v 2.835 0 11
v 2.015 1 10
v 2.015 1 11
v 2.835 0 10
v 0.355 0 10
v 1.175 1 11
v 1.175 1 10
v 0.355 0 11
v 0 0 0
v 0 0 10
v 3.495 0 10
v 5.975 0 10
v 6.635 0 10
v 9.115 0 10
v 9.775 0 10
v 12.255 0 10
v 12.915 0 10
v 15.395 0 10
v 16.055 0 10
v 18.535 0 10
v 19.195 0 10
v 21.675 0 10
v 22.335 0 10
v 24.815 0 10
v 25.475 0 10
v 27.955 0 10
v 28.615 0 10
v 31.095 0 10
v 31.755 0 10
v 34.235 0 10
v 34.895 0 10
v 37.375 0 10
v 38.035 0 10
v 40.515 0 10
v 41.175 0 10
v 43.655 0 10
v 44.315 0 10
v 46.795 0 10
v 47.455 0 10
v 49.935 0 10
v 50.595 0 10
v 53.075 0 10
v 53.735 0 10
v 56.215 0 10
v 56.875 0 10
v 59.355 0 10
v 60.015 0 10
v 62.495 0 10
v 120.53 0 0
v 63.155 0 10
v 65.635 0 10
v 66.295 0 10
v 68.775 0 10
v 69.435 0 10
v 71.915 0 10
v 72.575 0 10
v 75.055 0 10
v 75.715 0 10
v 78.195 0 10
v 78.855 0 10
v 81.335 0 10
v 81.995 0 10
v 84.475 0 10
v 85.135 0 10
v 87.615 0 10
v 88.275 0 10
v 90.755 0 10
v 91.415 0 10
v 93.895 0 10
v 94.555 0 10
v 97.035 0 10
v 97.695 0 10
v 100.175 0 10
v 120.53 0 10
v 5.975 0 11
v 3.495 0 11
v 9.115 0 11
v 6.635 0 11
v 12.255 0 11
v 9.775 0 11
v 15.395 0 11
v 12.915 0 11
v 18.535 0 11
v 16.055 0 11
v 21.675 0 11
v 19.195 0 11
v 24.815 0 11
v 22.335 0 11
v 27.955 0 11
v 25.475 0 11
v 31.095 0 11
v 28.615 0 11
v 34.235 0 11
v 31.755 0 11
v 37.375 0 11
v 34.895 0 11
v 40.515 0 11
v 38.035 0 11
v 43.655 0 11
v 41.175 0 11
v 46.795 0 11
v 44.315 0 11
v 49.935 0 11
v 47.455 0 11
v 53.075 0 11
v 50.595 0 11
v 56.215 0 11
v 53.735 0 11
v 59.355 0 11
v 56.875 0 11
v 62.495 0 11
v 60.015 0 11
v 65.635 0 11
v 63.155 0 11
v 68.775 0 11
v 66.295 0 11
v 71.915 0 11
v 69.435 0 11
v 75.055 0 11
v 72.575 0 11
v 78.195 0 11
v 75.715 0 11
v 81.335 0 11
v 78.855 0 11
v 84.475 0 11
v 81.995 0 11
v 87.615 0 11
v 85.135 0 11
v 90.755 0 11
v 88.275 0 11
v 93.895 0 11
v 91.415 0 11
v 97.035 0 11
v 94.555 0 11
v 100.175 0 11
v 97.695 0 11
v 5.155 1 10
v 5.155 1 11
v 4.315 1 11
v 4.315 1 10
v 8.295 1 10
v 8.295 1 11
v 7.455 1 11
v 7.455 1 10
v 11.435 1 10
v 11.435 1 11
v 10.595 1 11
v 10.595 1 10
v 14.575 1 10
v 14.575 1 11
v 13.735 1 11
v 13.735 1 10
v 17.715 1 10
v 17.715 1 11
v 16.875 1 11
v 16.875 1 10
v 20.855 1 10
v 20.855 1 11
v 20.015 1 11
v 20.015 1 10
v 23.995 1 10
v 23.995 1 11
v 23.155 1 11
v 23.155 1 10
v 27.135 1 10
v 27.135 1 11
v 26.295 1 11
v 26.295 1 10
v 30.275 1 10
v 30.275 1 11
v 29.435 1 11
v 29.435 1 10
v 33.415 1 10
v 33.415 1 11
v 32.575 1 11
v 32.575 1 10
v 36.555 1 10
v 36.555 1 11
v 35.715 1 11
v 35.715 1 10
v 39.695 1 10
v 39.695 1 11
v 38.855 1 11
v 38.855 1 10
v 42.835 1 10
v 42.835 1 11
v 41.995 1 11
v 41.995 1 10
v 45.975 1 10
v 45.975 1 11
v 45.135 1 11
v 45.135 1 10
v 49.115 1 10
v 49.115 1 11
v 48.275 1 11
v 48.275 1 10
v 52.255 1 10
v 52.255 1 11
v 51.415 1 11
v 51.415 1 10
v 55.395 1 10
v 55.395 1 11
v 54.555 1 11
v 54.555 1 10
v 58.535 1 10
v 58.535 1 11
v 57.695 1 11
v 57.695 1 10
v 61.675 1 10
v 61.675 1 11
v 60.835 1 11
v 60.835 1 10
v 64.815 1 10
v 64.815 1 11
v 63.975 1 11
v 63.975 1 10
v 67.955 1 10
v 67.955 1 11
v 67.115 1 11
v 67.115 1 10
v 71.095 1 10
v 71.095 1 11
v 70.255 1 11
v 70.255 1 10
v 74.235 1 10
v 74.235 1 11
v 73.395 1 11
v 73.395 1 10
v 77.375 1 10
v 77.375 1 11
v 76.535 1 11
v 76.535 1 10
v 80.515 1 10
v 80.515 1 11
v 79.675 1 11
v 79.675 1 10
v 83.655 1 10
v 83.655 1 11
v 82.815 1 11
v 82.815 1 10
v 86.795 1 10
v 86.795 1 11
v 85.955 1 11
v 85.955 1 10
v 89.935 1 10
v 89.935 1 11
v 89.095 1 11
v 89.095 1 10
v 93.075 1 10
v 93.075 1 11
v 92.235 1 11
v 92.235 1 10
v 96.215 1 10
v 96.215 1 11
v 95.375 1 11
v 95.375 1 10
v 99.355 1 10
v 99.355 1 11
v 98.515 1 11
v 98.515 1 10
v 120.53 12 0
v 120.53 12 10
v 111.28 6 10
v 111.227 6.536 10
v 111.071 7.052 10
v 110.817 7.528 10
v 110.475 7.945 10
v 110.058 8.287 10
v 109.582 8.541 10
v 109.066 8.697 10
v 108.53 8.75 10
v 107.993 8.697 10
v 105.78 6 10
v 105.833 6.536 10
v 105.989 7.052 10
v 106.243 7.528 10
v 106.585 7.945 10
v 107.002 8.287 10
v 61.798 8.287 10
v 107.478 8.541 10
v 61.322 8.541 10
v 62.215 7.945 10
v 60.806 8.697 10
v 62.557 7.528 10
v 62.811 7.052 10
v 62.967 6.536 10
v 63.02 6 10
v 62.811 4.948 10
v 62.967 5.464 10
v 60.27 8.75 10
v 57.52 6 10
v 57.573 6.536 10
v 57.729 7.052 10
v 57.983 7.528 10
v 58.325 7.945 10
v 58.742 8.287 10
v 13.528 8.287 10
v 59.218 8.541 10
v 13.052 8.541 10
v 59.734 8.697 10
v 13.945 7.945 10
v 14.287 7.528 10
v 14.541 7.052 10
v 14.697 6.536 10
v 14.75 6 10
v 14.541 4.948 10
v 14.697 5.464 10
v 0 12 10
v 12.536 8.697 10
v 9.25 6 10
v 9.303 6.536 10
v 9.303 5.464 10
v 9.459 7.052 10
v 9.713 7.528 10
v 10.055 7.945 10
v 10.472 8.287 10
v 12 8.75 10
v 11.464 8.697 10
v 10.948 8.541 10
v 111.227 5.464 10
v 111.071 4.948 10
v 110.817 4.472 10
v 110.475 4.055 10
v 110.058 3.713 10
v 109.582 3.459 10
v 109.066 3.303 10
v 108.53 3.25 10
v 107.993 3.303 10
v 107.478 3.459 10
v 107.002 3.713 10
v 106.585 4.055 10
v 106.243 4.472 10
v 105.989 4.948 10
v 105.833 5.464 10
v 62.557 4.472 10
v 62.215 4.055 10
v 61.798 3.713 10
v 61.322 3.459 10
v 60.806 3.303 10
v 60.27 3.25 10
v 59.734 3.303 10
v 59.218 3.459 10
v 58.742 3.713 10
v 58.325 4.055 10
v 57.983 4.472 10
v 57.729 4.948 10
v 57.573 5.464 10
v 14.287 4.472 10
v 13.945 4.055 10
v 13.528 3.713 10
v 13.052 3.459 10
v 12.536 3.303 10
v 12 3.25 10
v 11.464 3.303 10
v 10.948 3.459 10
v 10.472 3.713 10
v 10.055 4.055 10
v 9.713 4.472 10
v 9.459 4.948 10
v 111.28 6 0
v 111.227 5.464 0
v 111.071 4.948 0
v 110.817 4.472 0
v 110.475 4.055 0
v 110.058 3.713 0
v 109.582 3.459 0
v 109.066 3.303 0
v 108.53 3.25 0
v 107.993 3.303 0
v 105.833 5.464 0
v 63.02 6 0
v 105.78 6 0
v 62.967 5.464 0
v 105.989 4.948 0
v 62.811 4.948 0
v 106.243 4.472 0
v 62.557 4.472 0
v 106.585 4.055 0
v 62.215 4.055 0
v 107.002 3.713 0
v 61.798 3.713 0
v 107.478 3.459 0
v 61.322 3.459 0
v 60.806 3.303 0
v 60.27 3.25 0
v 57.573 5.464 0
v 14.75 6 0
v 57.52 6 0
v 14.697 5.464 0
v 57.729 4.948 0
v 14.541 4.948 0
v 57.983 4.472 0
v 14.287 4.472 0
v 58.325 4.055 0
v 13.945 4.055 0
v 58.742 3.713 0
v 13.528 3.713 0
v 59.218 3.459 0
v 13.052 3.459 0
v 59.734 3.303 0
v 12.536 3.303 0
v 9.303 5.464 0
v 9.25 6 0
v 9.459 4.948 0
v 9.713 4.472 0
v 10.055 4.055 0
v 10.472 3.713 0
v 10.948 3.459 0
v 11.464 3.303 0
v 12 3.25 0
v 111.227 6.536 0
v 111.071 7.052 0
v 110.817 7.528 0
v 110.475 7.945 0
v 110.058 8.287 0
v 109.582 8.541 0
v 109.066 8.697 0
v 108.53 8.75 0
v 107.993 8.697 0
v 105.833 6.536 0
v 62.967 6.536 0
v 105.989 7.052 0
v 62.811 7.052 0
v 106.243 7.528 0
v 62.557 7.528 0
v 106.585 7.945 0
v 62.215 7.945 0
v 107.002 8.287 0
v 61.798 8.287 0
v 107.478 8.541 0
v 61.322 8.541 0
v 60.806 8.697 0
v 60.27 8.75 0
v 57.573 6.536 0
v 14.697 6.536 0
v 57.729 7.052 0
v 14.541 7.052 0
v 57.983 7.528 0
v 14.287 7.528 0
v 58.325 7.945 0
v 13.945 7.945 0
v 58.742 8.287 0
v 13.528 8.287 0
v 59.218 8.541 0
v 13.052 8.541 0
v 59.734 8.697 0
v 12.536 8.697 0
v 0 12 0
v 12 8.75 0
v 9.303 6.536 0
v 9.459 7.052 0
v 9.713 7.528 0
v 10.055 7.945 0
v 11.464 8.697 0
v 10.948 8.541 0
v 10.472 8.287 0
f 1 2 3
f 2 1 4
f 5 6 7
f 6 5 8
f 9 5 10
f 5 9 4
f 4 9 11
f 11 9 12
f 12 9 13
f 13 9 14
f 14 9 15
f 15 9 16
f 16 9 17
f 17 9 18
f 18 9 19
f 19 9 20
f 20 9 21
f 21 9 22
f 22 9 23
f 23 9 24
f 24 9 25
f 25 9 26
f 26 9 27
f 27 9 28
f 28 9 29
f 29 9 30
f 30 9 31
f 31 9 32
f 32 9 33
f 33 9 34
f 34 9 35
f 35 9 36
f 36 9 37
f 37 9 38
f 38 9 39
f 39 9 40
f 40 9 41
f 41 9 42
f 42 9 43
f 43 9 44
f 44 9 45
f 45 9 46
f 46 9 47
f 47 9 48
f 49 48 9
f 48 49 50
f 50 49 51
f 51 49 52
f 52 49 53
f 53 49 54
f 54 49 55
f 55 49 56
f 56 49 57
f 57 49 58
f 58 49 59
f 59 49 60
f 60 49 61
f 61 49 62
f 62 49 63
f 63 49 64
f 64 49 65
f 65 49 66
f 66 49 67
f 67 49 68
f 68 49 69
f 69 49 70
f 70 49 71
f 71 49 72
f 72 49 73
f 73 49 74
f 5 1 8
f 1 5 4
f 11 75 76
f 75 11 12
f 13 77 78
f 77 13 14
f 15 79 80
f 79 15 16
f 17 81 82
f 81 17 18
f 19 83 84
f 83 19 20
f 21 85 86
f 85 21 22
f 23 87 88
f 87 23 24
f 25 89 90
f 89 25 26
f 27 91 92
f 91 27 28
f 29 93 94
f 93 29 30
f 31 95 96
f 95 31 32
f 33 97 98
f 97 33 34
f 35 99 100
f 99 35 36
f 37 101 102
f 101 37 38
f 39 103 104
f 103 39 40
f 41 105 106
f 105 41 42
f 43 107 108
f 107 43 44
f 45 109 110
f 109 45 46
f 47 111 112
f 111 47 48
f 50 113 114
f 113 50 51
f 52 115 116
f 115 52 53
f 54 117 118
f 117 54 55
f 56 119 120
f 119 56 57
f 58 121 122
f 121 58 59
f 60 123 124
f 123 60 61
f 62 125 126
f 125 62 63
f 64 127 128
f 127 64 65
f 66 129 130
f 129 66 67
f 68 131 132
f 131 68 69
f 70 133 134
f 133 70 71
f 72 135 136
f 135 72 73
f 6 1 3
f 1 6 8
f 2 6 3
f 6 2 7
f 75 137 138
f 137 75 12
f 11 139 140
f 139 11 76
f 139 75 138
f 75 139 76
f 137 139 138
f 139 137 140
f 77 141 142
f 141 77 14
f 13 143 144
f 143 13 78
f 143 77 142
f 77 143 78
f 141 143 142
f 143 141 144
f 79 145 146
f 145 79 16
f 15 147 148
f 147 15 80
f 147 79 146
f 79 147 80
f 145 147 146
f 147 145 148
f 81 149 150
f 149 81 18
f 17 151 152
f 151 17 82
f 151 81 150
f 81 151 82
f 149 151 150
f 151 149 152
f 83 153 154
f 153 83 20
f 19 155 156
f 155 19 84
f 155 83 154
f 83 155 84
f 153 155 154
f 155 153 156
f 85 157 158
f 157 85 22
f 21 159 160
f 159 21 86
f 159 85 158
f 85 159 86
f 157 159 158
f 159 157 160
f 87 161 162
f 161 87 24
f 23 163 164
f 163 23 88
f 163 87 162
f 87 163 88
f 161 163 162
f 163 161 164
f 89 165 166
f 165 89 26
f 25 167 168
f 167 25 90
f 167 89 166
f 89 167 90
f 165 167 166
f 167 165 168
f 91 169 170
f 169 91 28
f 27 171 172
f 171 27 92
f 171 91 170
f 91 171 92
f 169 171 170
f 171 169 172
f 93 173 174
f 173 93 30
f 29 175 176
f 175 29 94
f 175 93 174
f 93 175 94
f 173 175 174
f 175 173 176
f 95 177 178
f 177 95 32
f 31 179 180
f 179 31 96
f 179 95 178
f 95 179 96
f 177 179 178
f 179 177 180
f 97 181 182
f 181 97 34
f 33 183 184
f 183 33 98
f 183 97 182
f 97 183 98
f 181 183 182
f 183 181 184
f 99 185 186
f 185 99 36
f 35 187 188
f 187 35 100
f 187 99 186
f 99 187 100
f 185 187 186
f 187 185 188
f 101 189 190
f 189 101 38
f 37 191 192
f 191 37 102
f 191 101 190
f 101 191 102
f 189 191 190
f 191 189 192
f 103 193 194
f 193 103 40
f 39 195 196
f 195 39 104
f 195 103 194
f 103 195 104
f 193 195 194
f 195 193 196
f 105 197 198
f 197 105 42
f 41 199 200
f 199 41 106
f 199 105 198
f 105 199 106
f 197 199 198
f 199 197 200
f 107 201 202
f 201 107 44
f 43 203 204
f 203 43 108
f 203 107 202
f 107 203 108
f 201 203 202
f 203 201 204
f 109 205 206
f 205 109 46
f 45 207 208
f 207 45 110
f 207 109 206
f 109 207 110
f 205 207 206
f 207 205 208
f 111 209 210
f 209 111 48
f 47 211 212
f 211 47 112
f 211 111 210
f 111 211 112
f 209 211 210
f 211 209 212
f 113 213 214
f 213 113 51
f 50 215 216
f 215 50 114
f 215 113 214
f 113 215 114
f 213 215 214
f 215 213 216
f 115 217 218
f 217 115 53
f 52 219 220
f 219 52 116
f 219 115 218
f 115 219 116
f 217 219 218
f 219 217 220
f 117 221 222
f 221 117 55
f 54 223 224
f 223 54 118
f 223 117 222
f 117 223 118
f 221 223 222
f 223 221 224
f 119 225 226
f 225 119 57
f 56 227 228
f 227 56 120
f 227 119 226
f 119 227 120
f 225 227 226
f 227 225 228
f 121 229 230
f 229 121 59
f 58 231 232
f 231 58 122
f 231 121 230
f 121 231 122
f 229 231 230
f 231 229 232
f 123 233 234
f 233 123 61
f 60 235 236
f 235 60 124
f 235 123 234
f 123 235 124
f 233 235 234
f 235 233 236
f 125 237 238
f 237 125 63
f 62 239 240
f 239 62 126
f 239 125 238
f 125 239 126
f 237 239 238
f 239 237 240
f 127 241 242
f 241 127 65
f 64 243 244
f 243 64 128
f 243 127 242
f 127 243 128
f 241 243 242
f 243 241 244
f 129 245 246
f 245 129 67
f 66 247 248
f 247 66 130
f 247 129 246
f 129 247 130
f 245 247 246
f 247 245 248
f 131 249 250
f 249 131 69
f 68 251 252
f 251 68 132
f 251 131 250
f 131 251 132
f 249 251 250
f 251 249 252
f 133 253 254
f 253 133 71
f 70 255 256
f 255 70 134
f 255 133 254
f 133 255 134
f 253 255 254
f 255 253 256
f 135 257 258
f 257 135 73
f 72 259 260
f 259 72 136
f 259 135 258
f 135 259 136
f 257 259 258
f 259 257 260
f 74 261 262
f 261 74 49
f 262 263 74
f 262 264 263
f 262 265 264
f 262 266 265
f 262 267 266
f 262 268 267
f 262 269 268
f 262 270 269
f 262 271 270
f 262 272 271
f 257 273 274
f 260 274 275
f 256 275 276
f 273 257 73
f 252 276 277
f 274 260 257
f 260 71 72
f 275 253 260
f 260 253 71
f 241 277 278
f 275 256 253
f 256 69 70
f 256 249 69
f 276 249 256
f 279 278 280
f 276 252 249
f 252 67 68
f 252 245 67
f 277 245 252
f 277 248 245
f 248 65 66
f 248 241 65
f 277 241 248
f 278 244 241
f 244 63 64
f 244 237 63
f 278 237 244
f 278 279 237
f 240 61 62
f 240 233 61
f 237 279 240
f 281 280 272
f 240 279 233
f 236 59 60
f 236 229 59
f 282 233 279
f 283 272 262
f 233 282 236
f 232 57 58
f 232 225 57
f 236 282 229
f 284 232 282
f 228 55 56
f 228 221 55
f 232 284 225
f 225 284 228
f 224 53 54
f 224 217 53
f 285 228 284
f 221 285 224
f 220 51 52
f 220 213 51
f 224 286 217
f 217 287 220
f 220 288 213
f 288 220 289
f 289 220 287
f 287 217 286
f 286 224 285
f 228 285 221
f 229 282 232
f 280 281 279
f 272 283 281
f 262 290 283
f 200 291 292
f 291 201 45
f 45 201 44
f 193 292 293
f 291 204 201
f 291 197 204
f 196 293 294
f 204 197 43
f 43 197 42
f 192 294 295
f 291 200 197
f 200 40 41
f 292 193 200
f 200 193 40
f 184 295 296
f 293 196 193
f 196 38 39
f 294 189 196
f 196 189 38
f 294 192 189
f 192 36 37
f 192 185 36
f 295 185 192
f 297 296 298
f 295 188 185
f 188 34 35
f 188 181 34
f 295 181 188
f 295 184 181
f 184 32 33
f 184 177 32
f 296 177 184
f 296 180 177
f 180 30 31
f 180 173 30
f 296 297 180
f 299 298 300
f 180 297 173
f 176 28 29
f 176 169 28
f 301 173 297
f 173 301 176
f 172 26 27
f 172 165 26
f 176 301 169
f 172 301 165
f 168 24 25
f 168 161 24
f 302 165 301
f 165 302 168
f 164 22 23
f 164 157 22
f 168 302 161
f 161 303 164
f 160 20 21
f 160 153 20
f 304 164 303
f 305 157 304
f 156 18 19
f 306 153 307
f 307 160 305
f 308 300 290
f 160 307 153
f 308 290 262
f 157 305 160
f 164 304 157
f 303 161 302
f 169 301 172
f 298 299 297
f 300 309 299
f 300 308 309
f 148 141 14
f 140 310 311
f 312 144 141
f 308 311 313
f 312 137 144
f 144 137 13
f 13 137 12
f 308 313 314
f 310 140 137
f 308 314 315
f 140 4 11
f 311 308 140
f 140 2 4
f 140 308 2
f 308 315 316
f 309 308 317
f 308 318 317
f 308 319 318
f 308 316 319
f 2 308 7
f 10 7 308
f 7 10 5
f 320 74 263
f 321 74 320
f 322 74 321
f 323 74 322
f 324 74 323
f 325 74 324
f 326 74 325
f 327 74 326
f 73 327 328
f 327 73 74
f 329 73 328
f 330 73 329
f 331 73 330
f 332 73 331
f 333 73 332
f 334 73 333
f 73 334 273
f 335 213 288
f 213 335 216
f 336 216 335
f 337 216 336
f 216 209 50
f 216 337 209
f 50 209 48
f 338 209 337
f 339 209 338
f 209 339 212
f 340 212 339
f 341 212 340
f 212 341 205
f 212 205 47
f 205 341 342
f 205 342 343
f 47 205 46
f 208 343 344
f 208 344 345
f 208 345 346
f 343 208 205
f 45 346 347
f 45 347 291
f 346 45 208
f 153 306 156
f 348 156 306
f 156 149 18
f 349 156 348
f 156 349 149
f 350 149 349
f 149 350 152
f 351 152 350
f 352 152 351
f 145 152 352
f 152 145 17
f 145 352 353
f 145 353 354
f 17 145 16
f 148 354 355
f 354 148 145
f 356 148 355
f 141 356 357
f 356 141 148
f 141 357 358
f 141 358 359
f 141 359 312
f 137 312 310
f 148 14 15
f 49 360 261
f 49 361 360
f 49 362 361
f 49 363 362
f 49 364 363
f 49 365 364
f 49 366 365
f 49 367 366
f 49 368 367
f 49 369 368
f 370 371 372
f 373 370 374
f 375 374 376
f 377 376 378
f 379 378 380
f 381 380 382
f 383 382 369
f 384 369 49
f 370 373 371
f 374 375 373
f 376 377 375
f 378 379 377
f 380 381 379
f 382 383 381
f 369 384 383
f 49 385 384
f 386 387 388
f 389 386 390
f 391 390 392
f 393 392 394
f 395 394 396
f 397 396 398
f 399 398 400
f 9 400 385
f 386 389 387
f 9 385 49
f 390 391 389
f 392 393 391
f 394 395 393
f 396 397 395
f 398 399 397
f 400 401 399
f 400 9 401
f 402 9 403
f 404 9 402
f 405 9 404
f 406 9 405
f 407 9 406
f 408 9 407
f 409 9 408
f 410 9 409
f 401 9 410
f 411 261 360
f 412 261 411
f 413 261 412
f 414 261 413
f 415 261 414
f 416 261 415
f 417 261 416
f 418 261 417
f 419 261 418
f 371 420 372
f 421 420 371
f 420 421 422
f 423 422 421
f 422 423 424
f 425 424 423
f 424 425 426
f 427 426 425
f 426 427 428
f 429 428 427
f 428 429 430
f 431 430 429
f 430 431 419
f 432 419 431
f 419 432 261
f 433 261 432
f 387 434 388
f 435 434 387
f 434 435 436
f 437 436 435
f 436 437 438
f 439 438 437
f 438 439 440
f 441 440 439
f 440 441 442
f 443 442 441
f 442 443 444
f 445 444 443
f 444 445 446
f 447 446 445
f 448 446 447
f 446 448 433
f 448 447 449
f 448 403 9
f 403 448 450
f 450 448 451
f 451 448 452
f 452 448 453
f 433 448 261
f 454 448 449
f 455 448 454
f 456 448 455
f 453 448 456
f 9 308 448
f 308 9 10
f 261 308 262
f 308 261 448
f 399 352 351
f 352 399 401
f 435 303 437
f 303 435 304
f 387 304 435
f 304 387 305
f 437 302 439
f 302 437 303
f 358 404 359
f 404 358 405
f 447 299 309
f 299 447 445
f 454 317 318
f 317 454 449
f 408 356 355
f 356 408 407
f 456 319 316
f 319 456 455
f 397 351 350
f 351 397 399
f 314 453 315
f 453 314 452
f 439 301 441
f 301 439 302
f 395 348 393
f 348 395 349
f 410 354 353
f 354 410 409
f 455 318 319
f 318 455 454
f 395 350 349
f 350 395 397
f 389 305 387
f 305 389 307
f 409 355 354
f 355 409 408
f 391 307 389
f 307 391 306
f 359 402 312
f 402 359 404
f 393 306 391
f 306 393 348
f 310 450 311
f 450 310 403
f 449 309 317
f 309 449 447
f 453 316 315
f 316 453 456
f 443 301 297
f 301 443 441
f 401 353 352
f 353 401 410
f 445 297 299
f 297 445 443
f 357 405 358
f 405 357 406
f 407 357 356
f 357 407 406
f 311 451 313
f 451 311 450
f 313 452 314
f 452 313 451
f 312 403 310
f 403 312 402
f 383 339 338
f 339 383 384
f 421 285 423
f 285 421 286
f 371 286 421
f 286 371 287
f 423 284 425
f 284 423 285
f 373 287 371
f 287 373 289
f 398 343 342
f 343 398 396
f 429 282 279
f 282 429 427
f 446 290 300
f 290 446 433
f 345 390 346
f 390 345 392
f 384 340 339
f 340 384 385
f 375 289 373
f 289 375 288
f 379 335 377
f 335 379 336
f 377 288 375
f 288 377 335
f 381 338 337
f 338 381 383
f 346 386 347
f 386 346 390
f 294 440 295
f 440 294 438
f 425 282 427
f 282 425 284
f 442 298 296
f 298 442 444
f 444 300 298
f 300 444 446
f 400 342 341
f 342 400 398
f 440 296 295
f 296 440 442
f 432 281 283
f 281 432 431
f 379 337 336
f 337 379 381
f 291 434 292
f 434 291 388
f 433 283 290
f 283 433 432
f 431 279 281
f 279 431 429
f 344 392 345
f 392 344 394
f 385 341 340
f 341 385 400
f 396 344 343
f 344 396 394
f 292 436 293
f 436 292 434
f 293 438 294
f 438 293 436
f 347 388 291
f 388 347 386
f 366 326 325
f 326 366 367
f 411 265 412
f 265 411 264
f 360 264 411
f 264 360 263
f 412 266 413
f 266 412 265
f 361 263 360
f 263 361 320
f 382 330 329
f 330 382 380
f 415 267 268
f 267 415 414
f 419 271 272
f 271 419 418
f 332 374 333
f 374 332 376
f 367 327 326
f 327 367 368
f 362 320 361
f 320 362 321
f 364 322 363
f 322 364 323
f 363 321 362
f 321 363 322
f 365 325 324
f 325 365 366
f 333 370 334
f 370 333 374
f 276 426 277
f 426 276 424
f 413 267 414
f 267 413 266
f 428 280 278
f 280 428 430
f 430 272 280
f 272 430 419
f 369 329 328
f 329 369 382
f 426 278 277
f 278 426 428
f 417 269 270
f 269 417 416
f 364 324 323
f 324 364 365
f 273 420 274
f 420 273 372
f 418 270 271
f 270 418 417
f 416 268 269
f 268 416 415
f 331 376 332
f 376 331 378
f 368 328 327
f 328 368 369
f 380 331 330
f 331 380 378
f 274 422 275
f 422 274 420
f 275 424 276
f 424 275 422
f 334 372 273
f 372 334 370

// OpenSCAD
$fn = 32;

// ----------------------------------------------------------------------
// Gear rack: m=1 z=32, 120.53 x 12 x 11 mm
// ----------------------------------------------------------------------

// --- parameters (mm) ---
bar_len = 120.53;         // rack length, X
bar_w = 12;               // rack width, Y
bar_h = 11;               // overall height, Z
gear_module = 1;          // module
base_t = 10;              // tooth root line height
pitch = 3.14;             // circular pitch
tip_w = 0.84;             // tooth thickness at the tip
root_w = 2.48;            // tooth thickness at the root line
hole_d = 5.5;             // mounting hole
sink = 0.6;               // tooth root overlap into the body

tooth_span = 100.53;

module tooth(x0) {
  /* 20 deg flank profile, sunk into the body for a positive overlap */
  translate([x0, 0, base_t - sink])
    linear_extrude(height = bar_h - base_t + sink)
      polygon(points = [[-root_w / 2, 0], [root_w / 2, 0],
                        [tip_w / 2, bar_h - base_t],
                        [-tip_w / 2, bar_h - base_t]]);
}

difference() {
  union() {
    cube([bar_len, bar_w, base_t]);
    for (i = [0 : 32 - 1])
      tooth((i + 0.5) * pitch + (tooth_span - 32 * pitch) / 2);
  }
  translate([12, 6, -1]) cylinder(h = base_t + 2, d = hole_d);
  translate([60.27, 6, -1]) cylinder(h = base_t + 2, d = hole_d);
  translate([108.53, 6, -1]) cylinder(h = base_t + 2, d = hole_d);
}
